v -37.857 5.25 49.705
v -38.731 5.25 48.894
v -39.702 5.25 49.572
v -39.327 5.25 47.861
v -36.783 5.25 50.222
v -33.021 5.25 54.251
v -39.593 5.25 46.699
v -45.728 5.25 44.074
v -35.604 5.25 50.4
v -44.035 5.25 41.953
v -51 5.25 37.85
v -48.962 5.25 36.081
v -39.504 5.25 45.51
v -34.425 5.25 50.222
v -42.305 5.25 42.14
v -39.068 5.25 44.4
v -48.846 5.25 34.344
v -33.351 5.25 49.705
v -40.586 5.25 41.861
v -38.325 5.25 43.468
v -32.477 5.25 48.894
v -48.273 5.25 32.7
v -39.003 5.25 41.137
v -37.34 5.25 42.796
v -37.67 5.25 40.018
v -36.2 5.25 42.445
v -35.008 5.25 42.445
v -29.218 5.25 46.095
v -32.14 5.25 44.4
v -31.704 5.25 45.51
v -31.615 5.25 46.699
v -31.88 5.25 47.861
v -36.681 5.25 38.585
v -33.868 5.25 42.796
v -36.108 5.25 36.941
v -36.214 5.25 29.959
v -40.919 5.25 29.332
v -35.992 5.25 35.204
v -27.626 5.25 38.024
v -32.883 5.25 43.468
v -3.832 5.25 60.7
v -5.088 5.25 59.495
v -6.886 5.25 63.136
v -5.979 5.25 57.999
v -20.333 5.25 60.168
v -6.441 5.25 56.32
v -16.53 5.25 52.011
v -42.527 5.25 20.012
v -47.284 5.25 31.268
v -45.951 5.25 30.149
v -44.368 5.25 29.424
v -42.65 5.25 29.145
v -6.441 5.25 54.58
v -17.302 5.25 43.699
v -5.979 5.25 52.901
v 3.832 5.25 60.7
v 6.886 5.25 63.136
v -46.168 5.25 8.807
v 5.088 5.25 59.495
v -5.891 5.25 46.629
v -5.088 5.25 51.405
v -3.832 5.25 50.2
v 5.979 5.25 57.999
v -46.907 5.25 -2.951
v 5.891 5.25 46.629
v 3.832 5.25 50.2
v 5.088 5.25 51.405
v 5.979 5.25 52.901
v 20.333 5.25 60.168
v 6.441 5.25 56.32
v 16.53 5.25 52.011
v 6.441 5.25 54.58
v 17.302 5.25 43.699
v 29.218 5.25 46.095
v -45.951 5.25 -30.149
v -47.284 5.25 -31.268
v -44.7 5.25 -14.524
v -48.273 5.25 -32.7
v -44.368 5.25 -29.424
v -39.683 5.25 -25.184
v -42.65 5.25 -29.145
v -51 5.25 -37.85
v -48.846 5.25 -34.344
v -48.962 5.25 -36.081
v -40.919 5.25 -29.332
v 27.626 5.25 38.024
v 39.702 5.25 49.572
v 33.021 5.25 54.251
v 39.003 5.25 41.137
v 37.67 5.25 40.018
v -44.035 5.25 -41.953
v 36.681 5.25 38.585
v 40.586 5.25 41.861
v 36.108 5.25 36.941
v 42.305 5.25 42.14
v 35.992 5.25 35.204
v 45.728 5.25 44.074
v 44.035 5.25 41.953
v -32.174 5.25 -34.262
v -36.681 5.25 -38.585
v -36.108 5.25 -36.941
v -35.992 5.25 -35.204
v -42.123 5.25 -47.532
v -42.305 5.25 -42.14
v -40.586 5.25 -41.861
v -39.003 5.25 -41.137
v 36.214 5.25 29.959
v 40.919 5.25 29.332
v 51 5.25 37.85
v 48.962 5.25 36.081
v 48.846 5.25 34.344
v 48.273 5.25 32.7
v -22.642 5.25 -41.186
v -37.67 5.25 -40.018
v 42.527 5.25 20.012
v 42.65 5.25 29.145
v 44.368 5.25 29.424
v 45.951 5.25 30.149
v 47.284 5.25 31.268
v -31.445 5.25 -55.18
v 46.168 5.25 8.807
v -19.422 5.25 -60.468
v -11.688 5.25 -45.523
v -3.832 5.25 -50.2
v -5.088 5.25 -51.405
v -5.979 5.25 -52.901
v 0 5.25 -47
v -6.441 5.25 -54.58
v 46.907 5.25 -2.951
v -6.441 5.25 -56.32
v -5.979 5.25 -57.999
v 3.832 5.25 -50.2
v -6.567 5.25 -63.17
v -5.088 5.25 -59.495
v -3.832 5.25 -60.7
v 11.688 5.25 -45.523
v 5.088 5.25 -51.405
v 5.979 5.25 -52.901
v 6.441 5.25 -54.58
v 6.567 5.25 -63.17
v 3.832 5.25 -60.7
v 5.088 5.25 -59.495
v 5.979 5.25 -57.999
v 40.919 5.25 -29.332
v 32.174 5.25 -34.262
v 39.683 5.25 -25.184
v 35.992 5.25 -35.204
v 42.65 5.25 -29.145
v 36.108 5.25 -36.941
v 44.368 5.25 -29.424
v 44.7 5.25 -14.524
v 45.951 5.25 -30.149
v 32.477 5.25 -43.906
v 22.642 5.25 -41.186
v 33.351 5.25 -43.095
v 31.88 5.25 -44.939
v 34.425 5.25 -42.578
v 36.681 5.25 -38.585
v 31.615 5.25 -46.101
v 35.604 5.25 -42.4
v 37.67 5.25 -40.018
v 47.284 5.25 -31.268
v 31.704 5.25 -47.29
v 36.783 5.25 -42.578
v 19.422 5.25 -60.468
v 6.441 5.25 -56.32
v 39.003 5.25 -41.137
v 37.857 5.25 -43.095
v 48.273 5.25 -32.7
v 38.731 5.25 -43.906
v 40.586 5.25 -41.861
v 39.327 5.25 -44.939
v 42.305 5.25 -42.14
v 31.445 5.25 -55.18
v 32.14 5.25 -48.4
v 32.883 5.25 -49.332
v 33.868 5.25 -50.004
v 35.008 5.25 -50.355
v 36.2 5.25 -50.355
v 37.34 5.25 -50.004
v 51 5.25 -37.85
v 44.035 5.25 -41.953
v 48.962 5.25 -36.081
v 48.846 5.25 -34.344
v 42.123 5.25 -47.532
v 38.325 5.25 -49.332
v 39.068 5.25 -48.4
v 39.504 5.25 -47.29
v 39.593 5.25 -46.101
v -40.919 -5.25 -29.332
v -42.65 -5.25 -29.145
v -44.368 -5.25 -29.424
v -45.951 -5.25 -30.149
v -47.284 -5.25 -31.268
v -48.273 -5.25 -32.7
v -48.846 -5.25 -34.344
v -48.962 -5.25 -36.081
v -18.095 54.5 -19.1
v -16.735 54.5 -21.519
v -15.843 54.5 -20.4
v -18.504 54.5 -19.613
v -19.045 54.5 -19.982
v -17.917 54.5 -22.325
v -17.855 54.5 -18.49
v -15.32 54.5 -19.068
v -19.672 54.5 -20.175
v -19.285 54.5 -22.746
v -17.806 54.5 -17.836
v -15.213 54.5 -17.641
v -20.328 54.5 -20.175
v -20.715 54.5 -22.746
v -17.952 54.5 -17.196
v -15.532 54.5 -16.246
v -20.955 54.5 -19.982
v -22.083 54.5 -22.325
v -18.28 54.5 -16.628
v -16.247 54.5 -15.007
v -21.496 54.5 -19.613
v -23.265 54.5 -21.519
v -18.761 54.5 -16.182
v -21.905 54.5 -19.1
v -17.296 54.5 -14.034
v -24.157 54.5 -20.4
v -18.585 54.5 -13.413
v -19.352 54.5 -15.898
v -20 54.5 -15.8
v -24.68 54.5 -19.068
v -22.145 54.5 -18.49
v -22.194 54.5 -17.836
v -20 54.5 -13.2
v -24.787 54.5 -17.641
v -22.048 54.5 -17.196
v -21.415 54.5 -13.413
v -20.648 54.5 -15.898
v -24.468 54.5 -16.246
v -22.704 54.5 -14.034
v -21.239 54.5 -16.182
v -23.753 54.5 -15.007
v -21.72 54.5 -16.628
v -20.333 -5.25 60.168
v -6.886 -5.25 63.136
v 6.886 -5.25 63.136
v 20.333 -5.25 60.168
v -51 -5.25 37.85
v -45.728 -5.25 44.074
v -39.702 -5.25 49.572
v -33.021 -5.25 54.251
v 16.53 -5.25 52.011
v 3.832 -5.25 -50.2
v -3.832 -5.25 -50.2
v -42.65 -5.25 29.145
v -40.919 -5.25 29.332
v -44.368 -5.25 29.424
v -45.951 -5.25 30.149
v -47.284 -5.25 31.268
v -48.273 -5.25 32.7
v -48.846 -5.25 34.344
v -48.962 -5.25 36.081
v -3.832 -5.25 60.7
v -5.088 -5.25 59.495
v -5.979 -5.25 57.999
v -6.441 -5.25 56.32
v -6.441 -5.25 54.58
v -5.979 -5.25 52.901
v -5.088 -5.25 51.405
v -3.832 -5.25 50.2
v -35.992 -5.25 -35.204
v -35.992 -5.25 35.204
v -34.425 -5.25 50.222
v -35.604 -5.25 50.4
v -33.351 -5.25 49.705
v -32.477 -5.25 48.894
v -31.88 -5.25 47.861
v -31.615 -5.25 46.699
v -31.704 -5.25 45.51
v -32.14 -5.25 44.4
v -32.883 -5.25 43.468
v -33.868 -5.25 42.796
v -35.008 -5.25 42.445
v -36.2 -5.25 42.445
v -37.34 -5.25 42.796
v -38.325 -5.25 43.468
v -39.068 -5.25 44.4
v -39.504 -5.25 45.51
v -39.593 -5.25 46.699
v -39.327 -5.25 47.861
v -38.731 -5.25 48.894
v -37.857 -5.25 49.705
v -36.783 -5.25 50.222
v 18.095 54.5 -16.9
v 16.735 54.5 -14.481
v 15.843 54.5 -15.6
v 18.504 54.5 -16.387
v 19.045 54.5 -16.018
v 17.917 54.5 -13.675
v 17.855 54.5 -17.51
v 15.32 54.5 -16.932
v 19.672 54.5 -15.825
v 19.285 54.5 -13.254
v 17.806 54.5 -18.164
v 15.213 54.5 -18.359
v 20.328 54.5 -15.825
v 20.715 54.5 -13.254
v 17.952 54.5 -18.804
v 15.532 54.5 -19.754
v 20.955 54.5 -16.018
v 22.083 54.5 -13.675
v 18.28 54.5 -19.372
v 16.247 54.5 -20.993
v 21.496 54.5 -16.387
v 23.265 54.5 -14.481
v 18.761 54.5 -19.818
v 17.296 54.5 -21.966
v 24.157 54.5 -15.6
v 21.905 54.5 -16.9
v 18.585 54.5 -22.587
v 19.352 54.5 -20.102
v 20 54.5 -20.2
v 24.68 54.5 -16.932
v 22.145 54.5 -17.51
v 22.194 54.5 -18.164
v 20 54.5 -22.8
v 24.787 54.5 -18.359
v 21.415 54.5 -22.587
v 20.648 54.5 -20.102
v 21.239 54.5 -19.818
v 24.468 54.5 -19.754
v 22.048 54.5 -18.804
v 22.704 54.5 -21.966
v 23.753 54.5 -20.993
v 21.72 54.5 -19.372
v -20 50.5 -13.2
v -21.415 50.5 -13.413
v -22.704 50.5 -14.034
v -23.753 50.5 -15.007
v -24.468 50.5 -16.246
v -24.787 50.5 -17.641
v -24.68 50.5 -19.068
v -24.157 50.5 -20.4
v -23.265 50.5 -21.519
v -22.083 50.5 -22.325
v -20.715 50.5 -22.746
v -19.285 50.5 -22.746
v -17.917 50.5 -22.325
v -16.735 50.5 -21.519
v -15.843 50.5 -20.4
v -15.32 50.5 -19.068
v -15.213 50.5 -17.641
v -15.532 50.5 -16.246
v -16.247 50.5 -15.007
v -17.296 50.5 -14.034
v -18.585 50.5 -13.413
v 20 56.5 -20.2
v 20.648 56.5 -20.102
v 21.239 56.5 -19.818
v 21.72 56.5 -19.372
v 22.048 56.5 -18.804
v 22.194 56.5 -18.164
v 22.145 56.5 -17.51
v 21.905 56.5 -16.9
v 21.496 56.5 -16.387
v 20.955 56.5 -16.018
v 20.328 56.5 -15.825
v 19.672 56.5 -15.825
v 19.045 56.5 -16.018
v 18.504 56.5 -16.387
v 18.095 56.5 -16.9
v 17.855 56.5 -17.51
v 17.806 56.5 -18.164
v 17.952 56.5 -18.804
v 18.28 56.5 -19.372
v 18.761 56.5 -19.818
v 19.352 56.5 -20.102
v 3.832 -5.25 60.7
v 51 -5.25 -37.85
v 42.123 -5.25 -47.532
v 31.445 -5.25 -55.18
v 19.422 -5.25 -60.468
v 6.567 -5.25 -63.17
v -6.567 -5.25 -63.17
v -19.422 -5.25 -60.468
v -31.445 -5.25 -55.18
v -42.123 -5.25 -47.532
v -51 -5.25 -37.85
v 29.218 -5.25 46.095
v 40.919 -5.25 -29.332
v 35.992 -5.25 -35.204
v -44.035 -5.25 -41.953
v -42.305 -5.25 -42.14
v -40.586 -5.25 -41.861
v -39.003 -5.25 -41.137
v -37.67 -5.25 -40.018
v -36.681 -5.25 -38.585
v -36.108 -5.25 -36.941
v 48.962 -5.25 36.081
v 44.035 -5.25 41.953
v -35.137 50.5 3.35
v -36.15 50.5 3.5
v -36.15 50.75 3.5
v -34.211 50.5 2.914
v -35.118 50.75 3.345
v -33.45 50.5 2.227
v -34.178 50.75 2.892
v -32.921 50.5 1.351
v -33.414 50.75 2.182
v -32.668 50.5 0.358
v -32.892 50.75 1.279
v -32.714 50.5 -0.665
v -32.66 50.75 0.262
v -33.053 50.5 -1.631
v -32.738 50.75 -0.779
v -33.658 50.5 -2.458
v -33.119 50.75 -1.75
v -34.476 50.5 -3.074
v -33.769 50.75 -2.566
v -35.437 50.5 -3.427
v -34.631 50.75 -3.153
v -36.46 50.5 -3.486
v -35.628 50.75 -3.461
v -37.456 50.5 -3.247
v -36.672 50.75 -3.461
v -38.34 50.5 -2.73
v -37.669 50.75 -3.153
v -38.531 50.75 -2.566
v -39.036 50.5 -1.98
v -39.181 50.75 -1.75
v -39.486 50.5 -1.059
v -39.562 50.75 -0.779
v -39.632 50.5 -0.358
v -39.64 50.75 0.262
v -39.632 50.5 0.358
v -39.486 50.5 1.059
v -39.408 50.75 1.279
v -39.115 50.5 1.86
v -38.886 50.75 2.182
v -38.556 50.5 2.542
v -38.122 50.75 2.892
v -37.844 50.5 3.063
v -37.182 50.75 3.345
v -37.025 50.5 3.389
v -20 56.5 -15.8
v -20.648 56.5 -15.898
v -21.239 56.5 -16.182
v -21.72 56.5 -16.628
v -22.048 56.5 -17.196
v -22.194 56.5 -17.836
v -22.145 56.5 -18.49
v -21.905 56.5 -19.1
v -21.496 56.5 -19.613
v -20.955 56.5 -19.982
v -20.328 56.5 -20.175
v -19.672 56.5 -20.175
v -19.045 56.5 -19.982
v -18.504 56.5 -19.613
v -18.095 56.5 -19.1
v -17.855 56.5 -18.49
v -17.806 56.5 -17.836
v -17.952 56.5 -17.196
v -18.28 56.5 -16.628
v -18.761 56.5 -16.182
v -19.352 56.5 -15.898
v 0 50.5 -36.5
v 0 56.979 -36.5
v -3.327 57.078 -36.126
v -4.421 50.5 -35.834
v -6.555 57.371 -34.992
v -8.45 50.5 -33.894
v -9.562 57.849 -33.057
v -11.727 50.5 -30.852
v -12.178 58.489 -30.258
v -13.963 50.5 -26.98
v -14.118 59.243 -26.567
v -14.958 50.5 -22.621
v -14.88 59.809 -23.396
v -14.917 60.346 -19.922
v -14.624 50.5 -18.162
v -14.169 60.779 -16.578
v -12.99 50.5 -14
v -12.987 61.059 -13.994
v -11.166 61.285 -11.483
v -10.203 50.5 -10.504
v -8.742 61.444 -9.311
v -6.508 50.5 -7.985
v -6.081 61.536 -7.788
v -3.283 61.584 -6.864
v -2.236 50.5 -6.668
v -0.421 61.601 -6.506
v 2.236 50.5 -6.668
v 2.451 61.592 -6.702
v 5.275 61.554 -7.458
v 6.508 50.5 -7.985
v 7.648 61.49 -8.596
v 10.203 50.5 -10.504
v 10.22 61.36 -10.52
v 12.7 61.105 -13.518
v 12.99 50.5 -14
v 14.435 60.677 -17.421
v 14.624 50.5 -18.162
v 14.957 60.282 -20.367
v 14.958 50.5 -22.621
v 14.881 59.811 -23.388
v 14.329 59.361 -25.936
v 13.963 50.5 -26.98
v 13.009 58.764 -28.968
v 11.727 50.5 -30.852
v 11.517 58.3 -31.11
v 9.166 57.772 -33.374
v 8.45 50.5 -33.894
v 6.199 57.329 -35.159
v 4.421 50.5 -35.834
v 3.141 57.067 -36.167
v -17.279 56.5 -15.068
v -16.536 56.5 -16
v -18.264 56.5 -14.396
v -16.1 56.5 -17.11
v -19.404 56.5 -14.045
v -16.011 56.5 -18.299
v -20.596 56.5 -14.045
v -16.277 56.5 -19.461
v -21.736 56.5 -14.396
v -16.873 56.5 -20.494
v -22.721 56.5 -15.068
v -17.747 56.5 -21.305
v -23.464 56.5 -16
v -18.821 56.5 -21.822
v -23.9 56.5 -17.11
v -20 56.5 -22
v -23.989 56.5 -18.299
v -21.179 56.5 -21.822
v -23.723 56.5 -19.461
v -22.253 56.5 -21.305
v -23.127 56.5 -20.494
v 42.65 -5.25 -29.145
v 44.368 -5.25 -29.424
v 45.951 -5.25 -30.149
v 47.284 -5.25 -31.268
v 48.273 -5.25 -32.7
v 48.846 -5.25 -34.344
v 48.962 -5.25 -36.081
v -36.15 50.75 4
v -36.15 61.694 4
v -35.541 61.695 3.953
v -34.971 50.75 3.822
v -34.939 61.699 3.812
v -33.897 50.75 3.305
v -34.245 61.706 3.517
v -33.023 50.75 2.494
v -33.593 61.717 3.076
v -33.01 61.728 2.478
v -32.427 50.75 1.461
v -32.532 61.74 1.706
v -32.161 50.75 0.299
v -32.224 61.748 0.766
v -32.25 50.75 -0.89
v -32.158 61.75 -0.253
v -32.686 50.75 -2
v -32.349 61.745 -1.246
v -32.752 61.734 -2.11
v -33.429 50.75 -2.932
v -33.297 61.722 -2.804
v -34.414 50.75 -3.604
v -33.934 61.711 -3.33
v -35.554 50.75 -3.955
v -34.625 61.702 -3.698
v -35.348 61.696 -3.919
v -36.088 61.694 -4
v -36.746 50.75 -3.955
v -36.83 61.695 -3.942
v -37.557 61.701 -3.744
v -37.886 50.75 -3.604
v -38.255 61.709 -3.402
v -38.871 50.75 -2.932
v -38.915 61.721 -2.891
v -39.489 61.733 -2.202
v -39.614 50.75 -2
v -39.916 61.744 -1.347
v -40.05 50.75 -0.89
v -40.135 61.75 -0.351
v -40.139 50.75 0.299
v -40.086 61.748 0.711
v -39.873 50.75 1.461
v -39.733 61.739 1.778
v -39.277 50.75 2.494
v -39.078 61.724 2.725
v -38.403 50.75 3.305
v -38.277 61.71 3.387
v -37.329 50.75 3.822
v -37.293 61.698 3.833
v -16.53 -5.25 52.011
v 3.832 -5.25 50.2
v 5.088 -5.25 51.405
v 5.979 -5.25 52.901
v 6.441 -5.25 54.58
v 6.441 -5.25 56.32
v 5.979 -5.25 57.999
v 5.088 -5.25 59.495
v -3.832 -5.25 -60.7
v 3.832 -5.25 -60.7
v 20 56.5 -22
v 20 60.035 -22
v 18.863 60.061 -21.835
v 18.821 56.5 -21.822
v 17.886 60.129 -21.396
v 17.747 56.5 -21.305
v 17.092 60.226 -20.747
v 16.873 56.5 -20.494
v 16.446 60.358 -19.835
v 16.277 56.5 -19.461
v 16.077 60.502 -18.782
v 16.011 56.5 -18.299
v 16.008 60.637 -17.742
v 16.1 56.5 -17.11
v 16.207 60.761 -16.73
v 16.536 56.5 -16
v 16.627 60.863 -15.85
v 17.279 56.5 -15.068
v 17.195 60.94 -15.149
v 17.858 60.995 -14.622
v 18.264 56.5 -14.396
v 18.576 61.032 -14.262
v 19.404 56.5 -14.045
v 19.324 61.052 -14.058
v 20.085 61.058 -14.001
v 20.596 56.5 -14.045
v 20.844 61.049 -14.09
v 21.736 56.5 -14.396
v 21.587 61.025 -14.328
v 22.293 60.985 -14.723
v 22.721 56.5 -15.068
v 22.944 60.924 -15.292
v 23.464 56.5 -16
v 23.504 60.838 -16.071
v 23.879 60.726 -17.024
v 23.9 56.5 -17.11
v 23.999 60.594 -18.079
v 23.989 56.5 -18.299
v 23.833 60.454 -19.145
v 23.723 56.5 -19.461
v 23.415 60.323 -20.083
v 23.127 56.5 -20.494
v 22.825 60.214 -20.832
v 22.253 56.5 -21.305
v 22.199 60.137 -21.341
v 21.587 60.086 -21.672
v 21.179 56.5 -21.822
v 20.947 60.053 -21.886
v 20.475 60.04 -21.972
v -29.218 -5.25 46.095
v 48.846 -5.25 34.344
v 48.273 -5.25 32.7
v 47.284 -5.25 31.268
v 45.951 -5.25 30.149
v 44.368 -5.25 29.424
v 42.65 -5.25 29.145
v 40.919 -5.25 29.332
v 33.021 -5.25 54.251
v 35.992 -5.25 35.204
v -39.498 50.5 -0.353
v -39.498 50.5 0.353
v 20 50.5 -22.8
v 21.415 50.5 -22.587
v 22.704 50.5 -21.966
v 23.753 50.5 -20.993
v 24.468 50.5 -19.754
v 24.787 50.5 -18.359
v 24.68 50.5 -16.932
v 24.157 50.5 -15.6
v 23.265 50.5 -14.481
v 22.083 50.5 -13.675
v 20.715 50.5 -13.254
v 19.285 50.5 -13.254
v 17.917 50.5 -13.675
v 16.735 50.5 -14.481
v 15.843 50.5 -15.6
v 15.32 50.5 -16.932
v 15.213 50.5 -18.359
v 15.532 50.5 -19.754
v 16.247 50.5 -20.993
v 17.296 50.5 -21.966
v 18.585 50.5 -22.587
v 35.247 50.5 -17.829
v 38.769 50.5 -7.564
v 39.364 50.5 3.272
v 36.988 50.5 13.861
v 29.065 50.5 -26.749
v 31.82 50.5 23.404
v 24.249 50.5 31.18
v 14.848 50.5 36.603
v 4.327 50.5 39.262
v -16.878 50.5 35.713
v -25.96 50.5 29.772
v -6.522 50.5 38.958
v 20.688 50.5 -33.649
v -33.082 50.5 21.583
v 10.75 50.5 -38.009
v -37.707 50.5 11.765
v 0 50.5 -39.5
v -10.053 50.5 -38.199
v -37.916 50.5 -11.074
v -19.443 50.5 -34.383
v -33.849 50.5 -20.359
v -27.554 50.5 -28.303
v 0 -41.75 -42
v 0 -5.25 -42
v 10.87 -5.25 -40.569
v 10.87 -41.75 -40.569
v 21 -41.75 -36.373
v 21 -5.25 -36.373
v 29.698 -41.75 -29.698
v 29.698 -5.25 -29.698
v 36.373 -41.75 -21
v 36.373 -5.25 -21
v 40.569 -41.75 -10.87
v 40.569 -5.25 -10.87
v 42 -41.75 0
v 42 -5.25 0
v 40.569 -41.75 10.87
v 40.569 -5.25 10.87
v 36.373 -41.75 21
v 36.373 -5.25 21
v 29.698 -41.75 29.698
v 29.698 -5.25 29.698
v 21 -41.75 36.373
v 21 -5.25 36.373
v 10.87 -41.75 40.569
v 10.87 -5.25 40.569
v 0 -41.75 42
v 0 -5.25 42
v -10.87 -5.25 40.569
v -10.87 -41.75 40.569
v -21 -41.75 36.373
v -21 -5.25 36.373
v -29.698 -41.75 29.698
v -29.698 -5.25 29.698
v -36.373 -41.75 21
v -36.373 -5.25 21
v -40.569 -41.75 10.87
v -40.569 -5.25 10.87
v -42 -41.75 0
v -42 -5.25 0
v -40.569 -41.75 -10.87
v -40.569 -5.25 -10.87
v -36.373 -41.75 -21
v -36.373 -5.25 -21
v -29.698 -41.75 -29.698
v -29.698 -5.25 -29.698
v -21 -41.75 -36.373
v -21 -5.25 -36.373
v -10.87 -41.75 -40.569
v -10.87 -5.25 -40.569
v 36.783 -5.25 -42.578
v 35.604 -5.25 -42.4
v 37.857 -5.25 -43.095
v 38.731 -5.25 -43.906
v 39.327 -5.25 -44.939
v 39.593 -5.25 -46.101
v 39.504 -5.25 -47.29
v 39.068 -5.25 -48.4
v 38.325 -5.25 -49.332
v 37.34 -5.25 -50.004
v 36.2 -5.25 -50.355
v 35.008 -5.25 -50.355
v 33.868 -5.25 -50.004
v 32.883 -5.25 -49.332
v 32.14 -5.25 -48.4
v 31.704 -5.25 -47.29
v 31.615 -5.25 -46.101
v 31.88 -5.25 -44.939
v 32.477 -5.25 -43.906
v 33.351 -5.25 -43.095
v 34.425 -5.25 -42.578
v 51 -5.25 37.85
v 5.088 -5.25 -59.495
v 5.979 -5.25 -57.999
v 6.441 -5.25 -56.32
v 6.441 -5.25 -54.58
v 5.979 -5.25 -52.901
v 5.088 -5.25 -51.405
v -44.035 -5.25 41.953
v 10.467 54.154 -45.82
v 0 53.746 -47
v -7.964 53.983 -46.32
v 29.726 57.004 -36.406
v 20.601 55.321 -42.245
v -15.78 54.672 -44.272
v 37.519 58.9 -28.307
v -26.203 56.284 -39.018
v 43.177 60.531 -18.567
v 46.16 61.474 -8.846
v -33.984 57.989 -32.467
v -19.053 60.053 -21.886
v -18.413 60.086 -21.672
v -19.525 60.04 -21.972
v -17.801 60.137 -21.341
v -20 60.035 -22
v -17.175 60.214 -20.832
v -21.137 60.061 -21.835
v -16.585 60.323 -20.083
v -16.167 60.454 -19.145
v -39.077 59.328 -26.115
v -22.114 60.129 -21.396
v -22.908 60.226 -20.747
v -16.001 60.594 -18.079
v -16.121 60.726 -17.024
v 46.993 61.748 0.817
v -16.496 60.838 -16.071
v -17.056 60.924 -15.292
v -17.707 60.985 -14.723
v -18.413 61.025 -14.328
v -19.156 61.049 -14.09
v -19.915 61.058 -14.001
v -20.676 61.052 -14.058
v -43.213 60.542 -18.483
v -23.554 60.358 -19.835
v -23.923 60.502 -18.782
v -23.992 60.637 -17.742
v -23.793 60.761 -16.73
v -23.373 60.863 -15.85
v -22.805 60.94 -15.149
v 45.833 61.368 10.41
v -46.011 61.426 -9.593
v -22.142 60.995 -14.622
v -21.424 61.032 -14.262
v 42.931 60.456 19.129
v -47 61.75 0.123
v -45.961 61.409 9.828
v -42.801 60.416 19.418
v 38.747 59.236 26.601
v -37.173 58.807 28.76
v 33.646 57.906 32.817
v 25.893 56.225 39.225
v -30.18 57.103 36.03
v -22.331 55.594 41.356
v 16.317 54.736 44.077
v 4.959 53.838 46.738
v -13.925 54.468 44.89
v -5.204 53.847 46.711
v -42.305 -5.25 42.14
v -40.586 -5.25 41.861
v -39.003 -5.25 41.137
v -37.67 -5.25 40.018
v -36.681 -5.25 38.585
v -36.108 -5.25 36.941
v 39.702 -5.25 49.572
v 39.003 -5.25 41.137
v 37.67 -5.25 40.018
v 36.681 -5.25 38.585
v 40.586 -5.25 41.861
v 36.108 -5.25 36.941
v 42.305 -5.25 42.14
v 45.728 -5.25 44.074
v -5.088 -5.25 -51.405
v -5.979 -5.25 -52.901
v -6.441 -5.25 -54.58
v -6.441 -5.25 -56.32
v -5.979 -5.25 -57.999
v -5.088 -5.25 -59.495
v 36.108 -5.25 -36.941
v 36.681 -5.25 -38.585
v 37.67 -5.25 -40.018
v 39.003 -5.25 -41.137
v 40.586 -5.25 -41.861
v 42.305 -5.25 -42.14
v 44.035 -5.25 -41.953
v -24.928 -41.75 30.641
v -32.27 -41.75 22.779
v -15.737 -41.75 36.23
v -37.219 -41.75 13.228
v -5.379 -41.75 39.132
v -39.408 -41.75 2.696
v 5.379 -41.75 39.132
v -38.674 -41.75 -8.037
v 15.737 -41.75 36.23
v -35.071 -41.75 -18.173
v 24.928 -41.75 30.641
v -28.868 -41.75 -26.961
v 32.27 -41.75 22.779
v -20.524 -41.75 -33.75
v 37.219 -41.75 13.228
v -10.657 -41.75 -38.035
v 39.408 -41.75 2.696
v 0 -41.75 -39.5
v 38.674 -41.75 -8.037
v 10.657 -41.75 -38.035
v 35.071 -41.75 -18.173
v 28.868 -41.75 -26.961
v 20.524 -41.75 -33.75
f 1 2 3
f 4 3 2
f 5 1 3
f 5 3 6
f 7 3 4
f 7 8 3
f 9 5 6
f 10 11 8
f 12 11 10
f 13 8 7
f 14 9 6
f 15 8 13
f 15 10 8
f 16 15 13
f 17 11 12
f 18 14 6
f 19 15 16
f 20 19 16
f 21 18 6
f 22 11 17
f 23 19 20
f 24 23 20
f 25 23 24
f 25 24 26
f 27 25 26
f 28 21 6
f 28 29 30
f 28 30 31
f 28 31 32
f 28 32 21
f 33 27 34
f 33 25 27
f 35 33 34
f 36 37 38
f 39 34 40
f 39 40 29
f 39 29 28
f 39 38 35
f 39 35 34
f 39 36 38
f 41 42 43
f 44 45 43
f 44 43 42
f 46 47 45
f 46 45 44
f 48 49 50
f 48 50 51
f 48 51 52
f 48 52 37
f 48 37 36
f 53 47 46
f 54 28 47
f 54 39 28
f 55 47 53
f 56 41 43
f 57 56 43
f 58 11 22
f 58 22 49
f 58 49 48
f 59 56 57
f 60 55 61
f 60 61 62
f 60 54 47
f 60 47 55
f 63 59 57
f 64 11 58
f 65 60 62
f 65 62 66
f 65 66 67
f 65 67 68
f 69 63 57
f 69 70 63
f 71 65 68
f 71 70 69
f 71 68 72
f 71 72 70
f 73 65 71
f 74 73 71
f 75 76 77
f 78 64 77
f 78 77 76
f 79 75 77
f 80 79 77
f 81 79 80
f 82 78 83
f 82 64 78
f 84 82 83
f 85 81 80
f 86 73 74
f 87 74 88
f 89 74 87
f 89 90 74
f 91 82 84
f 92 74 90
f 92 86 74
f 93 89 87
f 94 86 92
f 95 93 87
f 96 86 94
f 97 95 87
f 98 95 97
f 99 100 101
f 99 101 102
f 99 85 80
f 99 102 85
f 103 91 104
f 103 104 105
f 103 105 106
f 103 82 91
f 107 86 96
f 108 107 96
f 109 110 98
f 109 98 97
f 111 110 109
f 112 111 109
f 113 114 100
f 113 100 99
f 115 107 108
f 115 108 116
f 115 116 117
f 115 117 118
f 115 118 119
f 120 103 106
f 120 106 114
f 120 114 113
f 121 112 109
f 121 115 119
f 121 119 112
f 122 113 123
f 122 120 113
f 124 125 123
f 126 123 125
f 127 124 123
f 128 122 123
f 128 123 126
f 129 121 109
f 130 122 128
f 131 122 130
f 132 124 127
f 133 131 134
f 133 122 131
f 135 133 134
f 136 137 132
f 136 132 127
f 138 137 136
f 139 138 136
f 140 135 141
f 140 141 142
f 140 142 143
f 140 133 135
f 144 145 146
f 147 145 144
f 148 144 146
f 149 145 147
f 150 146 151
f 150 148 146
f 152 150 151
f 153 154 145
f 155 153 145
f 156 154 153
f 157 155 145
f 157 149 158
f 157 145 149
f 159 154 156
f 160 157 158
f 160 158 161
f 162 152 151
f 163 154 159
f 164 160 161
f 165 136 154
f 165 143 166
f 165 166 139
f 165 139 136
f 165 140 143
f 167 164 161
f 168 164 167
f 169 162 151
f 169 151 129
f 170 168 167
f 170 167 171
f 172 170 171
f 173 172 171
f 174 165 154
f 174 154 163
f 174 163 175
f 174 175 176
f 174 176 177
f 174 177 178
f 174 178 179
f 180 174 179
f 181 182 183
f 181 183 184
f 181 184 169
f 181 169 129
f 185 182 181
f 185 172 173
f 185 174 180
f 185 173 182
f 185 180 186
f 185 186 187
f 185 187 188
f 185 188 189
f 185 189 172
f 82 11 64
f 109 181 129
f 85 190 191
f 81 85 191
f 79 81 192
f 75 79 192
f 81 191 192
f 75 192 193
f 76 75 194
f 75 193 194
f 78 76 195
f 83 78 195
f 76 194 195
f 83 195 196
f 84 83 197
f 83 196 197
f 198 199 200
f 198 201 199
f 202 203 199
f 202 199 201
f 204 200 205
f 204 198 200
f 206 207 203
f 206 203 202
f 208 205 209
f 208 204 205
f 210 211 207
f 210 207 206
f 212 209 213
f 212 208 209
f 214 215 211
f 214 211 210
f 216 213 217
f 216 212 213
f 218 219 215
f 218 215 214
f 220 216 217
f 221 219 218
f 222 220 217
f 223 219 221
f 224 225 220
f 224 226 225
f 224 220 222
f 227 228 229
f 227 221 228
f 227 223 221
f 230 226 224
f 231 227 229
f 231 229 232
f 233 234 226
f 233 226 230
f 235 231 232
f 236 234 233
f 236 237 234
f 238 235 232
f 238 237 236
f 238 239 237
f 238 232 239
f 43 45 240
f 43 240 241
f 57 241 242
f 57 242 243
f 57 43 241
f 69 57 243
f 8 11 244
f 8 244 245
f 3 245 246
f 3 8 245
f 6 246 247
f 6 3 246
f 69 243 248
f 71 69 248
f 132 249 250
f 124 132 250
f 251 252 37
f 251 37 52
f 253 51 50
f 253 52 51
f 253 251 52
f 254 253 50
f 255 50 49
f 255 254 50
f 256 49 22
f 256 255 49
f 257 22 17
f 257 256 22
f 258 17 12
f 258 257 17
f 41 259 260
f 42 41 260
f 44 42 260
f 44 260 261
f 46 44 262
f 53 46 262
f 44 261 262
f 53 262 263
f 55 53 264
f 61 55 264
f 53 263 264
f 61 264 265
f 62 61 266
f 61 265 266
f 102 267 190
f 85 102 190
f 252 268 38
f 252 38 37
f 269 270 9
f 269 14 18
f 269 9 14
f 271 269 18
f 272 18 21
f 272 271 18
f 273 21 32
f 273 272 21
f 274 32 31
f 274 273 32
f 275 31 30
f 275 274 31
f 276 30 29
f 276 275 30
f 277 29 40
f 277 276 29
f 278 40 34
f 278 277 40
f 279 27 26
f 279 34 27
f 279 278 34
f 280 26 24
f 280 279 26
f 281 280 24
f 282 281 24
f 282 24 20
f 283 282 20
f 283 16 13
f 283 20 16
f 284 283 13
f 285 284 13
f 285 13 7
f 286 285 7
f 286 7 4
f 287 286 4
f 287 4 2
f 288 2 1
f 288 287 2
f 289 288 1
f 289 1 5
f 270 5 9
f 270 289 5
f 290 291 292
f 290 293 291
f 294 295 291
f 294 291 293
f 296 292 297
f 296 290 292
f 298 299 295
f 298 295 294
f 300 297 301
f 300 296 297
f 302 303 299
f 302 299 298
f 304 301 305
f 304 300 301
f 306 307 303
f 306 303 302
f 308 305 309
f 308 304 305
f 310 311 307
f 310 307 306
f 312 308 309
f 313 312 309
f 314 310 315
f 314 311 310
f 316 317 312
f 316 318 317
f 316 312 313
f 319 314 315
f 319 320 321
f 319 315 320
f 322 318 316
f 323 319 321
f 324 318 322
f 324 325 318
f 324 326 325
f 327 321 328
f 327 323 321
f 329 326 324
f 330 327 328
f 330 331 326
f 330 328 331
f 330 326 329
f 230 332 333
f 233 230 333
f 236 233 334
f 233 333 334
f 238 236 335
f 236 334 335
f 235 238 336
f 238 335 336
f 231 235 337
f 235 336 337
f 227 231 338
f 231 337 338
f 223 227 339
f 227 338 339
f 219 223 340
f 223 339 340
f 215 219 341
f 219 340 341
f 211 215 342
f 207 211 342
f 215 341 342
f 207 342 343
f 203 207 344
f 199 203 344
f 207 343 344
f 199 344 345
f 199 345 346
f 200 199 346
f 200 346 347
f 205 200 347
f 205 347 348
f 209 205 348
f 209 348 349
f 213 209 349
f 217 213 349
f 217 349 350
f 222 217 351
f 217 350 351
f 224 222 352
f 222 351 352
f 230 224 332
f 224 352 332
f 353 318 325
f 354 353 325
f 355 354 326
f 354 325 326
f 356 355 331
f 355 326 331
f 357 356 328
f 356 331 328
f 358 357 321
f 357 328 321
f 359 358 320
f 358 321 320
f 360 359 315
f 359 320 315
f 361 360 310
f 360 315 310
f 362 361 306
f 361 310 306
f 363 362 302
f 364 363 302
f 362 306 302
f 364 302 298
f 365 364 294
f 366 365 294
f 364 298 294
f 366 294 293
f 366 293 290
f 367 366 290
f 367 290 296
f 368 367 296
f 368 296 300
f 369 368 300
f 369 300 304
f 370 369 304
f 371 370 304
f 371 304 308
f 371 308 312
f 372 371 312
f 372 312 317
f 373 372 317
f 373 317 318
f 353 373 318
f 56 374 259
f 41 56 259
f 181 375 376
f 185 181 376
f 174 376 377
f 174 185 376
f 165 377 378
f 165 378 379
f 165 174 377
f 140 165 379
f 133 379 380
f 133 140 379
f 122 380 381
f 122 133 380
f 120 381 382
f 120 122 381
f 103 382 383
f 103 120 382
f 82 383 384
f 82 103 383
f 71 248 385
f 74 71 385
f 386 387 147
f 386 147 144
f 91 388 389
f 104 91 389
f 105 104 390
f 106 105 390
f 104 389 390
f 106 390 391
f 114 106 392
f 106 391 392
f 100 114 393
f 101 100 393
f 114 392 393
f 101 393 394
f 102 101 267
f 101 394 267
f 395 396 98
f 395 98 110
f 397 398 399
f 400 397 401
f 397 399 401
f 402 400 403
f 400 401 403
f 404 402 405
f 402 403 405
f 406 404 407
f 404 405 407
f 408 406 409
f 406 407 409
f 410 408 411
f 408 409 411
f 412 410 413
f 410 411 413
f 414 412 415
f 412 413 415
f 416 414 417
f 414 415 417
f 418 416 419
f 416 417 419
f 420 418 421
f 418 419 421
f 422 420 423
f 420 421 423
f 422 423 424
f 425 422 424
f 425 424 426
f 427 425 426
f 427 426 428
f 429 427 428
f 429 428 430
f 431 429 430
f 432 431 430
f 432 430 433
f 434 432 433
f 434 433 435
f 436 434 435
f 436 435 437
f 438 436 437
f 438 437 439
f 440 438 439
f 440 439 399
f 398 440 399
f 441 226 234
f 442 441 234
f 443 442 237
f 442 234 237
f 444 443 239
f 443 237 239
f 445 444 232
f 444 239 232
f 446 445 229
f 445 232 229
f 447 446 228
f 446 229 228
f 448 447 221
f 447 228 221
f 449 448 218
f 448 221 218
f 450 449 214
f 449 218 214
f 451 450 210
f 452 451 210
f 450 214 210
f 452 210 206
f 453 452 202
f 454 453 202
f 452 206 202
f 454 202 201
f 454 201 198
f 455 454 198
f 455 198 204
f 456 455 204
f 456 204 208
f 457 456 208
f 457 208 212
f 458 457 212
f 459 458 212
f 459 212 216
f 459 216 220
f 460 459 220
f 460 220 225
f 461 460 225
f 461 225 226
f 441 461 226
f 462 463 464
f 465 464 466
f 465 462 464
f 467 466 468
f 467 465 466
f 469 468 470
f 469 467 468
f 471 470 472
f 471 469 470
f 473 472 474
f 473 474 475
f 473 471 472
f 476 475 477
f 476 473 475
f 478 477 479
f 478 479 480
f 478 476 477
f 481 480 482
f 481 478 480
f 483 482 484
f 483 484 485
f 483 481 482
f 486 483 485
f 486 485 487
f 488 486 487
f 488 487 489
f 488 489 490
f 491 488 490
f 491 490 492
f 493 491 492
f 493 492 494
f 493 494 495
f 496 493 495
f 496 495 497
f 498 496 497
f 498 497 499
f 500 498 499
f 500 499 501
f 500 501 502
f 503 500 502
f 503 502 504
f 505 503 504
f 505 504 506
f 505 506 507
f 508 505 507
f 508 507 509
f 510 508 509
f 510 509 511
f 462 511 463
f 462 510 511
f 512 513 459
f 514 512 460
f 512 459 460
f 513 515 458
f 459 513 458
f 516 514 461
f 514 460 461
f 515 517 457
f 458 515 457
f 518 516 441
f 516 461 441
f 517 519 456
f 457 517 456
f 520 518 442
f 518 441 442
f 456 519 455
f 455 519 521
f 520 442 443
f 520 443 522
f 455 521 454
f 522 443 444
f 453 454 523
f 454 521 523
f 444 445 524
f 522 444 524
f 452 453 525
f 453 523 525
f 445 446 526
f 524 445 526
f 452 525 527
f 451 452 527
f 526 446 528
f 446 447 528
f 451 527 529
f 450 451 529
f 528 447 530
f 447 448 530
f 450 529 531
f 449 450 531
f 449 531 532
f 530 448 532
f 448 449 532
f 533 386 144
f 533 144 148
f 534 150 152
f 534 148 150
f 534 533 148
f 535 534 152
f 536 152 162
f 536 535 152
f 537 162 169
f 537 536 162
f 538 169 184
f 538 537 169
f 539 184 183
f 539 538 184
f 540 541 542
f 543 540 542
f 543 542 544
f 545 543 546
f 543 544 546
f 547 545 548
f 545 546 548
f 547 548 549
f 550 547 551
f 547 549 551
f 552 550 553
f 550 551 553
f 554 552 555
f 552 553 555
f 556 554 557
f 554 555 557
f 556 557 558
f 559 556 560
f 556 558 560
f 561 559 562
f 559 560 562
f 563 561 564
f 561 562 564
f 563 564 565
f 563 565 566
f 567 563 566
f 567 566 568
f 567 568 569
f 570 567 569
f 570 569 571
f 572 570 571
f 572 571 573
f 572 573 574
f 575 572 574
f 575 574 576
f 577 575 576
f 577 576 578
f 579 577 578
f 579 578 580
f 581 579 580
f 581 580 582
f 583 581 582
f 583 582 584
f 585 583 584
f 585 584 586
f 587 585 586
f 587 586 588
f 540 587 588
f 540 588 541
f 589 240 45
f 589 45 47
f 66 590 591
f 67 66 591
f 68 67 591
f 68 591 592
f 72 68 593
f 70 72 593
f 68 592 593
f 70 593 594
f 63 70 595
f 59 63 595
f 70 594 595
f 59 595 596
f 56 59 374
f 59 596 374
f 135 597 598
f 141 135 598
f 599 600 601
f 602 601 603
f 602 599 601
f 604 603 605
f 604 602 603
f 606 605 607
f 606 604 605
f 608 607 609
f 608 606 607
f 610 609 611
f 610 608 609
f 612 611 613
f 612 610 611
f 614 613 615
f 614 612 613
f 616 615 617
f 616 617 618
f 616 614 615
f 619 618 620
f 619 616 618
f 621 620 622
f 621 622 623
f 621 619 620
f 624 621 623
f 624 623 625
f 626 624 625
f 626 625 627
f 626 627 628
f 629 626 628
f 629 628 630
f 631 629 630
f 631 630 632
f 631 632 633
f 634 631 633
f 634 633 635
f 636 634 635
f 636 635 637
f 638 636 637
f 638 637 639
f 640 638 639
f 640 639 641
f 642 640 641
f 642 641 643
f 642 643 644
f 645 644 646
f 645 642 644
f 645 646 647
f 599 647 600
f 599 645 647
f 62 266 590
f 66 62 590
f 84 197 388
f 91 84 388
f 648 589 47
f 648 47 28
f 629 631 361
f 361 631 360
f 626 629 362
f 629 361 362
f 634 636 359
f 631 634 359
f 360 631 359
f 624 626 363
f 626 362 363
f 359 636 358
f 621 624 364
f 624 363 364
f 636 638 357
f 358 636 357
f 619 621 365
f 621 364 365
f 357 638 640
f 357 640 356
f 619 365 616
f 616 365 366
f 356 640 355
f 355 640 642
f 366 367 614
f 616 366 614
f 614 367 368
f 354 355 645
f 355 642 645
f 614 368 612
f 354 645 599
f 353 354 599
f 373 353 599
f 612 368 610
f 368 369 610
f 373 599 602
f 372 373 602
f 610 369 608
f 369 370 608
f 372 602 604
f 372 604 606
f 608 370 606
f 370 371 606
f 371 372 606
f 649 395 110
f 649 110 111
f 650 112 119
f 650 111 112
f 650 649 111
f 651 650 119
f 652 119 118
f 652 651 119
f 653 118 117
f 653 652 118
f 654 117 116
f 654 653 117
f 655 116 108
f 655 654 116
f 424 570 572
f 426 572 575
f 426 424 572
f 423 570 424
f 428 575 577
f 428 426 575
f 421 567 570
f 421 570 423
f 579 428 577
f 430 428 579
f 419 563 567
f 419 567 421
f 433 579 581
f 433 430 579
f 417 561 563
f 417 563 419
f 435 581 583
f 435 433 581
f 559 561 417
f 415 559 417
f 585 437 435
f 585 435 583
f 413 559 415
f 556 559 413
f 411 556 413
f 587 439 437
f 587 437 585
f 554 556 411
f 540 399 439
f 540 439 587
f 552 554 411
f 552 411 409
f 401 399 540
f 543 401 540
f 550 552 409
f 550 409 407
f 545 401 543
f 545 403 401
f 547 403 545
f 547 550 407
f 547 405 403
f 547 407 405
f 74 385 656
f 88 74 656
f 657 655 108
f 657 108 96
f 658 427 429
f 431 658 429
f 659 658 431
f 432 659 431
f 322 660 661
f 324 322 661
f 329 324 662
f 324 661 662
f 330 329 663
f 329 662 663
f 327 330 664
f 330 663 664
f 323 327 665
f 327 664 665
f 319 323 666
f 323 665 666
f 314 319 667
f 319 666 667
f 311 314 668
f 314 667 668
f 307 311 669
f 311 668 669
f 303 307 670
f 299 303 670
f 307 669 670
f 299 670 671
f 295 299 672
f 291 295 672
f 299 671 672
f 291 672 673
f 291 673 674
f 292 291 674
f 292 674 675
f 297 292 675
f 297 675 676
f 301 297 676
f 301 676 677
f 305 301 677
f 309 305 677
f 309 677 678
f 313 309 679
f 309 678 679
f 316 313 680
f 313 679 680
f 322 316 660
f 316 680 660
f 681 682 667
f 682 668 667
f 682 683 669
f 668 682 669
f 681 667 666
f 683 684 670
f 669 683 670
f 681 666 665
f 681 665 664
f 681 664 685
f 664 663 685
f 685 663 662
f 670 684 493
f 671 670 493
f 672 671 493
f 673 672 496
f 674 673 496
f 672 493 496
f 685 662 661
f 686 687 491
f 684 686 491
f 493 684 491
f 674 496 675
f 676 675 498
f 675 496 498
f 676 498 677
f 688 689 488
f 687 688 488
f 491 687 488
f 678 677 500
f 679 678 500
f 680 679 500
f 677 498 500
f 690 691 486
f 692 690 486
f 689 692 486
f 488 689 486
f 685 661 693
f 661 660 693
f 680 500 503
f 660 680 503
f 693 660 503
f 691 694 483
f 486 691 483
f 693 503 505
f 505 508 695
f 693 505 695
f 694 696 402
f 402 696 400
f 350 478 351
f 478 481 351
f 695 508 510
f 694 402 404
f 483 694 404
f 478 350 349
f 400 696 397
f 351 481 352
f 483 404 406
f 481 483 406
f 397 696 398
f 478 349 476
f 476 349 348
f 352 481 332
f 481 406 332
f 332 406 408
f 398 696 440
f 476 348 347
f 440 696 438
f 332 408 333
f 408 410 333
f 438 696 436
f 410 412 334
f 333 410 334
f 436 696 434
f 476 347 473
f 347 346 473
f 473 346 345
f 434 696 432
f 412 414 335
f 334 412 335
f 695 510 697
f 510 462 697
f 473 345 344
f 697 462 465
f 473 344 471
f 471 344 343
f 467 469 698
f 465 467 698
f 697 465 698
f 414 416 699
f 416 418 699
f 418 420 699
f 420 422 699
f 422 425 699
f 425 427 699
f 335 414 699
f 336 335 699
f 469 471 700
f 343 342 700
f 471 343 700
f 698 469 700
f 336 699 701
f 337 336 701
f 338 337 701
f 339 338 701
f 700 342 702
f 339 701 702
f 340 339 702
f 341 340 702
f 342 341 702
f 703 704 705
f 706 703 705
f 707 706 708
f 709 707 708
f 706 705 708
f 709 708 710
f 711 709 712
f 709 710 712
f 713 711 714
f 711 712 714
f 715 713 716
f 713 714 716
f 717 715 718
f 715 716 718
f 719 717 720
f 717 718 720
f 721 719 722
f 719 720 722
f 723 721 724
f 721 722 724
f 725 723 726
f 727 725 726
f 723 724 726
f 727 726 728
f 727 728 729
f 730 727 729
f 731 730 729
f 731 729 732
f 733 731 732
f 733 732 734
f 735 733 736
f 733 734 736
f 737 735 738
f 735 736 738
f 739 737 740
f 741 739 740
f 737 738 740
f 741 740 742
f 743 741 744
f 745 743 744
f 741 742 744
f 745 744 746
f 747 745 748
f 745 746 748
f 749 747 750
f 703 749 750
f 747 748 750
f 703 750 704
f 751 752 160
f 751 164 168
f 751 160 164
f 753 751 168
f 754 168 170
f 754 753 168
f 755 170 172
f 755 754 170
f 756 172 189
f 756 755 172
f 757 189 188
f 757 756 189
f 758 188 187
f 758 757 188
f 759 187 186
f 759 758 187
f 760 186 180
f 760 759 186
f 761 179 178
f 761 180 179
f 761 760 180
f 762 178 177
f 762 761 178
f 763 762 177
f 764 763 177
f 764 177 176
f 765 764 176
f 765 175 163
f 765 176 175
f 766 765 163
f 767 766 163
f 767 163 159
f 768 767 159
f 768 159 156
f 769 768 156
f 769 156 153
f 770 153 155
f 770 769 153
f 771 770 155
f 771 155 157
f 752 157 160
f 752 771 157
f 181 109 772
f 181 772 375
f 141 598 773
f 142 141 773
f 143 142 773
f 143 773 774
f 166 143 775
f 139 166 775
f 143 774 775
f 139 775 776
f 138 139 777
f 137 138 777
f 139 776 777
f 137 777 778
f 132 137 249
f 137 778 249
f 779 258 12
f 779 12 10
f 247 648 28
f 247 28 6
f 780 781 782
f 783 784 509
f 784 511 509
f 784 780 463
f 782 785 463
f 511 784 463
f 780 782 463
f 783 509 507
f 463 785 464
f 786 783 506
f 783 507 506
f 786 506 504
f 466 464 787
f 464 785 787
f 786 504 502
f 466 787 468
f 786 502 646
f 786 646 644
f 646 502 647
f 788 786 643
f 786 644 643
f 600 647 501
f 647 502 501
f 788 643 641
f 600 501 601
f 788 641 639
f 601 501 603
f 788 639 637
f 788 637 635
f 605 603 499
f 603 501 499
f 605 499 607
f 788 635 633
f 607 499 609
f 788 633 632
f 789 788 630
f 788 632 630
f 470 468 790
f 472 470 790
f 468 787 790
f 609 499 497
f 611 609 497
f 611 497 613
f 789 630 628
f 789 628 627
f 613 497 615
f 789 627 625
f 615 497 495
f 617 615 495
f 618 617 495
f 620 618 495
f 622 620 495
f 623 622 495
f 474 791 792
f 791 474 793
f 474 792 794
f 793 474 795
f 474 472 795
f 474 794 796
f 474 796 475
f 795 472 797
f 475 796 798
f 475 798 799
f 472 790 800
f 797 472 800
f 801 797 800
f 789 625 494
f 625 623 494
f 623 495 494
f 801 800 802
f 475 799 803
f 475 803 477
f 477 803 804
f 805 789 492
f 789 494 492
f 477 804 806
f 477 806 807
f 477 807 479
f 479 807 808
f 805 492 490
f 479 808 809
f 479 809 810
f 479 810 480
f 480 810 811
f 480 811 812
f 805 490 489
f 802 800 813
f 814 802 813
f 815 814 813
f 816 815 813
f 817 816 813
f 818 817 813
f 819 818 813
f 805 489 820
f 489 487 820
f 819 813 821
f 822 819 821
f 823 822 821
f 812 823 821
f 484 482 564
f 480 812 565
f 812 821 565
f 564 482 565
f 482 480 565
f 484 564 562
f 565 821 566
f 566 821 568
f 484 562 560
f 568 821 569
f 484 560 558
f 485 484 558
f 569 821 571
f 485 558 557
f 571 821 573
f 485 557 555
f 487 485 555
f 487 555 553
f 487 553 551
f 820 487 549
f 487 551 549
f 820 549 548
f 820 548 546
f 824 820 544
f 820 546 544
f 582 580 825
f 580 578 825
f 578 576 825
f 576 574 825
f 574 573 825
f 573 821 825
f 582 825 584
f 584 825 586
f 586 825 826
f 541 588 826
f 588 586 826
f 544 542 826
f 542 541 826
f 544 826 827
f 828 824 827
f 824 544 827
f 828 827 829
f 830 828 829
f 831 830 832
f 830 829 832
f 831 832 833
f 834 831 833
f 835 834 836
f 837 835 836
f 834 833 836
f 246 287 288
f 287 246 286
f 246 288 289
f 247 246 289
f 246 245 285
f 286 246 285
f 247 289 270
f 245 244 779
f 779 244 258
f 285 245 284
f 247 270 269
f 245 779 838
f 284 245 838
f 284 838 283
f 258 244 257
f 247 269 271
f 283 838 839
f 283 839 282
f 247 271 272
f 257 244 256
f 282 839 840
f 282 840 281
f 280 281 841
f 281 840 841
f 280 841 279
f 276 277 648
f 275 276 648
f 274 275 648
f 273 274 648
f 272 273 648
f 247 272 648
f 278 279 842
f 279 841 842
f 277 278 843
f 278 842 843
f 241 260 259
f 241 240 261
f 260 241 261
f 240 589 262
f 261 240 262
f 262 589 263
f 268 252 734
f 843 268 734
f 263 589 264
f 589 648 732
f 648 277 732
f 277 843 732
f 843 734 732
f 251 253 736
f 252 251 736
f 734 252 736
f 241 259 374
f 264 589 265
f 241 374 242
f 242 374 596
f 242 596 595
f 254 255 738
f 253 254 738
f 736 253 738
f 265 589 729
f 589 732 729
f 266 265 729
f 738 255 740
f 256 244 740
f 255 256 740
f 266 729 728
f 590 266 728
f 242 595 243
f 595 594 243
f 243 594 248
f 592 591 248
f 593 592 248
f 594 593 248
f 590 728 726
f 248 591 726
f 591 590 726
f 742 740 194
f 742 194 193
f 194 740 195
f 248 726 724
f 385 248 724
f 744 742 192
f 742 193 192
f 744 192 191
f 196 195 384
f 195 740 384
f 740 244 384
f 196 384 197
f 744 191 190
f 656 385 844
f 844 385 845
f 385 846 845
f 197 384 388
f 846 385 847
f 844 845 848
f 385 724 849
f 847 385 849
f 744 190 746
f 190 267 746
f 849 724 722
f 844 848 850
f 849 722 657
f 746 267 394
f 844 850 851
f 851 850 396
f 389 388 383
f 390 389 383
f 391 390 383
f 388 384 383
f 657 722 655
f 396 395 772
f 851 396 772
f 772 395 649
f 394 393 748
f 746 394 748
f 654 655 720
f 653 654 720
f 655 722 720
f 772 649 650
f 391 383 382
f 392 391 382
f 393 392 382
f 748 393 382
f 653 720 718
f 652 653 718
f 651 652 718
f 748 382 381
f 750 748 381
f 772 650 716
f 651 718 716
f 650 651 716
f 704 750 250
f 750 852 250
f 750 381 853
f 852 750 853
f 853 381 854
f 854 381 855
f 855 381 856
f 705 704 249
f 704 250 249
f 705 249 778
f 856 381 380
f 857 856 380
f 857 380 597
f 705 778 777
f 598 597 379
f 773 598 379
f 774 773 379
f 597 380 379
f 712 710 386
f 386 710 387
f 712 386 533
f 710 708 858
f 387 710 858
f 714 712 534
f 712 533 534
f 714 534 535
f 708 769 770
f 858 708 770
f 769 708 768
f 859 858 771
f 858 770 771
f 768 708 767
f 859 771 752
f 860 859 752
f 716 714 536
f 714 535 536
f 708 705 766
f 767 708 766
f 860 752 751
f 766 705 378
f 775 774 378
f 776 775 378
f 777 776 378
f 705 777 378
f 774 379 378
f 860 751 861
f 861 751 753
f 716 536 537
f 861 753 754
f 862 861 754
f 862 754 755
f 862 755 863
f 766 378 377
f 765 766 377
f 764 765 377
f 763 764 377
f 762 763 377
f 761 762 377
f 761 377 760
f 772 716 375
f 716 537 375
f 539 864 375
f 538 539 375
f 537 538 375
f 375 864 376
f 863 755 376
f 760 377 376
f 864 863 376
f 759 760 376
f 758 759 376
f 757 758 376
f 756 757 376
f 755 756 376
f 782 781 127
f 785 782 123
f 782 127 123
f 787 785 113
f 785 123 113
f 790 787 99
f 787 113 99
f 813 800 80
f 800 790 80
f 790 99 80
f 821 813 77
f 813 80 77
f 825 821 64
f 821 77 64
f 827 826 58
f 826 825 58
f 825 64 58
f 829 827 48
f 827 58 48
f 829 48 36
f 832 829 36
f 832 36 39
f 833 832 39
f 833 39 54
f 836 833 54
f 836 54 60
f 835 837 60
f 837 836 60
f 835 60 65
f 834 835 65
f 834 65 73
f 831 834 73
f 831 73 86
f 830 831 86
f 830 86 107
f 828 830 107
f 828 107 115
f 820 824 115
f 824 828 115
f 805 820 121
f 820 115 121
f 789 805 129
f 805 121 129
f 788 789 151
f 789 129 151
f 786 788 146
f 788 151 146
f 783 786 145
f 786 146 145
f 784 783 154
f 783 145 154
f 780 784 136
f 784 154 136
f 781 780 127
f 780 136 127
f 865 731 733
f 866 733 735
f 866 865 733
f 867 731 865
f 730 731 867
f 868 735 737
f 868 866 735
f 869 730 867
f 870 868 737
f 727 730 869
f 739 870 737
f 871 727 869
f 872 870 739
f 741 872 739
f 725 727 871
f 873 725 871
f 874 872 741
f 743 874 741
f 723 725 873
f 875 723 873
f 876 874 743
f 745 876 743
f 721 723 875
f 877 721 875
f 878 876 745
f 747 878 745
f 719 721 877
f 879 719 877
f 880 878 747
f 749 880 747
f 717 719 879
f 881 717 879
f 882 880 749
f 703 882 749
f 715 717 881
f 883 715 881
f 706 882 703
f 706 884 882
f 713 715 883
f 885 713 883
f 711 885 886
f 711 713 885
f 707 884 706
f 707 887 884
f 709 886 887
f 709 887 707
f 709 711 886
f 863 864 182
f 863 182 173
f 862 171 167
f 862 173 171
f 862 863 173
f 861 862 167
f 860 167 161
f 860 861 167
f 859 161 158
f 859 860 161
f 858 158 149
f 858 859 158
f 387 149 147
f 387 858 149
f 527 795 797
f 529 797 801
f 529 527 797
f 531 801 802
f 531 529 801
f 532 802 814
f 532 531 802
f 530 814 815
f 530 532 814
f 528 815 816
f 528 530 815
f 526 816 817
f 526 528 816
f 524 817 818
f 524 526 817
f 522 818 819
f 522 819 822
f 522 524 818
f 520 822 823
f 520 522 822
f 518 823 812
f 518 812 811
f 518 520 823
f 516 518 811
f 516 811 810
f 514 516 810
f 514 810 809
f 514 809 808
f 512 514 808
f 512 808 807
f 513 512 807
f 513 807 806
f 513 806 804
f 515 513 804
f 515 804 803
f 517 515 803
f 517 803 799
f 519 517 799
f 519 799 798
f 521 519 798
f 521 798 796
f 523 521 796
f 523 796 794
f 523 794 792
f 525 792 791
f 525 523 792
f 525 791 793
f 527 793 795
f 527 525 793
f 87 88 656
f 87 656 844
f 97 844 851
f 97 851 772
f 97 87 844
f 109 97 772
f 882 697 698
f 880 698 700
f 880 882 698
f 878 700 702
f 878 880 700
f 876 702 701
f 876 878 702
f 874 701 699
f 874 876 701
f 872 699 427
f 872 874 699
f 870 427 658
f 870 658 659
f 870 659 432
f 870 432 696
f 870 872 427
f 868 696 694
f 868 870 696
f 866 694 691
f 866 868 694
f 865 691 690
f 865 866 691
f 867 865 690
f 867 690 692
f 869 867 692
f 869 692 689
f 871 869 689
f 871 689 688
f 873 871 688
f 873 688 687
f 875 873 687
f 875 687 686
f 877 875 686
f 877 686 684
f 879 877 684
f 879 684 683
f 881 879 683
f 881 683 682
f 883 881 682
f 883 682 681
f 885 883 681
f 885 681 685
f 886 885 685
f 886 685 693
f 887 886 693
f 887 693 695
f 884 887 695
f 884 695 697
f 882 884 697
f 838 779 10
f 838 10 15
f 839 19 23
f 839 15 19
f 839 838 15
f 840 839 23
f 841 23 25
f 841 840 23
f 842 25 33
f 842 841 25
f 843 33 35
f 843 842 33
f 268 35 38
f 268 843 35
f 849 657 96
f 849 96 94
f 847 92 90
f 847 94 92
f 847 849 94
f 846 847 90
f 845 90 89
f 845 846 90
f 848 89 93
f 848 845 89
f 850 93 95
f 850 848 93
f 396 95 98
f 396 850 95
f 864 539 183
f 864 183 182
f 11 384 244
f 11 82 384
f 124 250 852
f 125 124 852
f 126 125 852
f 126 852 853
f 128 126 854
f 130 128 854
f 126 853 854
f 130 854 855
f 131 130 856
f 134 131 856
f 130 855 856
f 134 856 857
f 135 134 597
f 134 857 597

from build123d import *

# Parameters (mm, degrees)
BOSS_EXTRUDE1_DEPTH     = 5.25
CUT_EXTRUDE1_DEPTH      = 82.622208988
CUT_EXTRUDE1_DEPTH_BACK = 82.622208988
SKETCH2_R               = 4
SKETCH3_R               = 47
BOSS_EXTRUDE2_DEPTH     = 56.5
CUT_EXTRUDE4_DEPTH      = 103.213917839
CUT_EXTRUDE4_DEPTH_BACK = 103.213917839
SKETCH5_R               = 4
SKETCH5_R_2             = 15
CUT_EXTRUDE5_DEPTH      = 56.5
SKETCH6_R               = 42
BOSS_EXTRUDE3_DEPTH     = 36.5
CUT_EXTRUDE6_DEPTH      = 50.5
CUT_EXTRUDE6_DEPTH_BACK = 42.5
SKETCH7_R               = 39.5
SKETCH9_R               = 4.8
BOSS_EXTRUDE4_DEPTH     = 6
SKETCH10_R              = 2.2
CUT_EXTRUDE7_DEPTH      = 124.063743645
SKETCH11_R              = 4.8
CUT_EXTRUDE8_DEPTH      = 4
SKETCH12_R              = 4
CUT_EXTRUDE9_DEPTH      = 11
SKETCH13_R              = 3.5
CUT_EXTRUDE10_DEPTH     = 11.25


with BuildPart() as part:
    # Sketch1 → Boss-Extrude1 (new, symmetric)
    with BuildSketch(Plane(origin=(0, 0, 0), x_dir=(1, 0, 0), z_dir=(0, 1, 0))):
        with BuildLine():
            Line((-51, 37.85), (-51, -37.85))
            ThreePointArc((-51, -37.85), (0, -63.510806167), (51, -37.85))
            Line((51, -37.85), (51, 37.85))
            ThreePointArc((51, 37.85), (0, 63.510806167), (-51, 37.85))
        make_face()
    extrude(amount=BOSS_EXTRUDE1_DEPTH, both=True)

    # Sketch2 → Cut-Extrude1 (cut, two sides: drawn at the far end of the back side and taken through both)
    with BuildSketch(Plane(origin=(0, 0, 0), x_dir=(1, 0, 0), z_dir=(0, 1, 0)).offset(-CUT_EXTRUDE1_DEPTH_BACK)):
        with Locations(Location((35.603972242, 46.4, 0), (0, 0, 270))):
            Circle(SKETCH2_R)
        with Locations(Location((-35.603972242, -46.4, 0), (0, 0, 270))):
            Circle(SKETCH2_R)
        with BuildLine():
            Line((-3.832427429, 60.7), (3.832427429, 60.7))
            ThreePointArc((3.832427429, 60.7), (6.5, 55.45), (3.832427429, 50.2))
            Line((3.832427429, 50.2), (-3.832427429, 50.2))
            ThreePointArc((-3.832427429, 50.2), (-6.5, 55.45), (-3.832427429, 60.7))
        make_face()
        with BuildLine():
            Line((-35.991994178, 35.203747742), (-40.918867911, 29.33212827))
            ThreePointArc((-40.918867911, 29.33212827), (-46.655283834, 30.663284077), (-48.962334564, 36.081398172))
            Line((-48.962334564, 36.081398172), (-44.035460831, 41.953017644))
            ThreePointArc((-44.035460831, 41.953017644), (-38.299044908, 40.621861837), (-35.991994178, 35.203747742))
        make_face()
        with BuildLine():
            Line((48.962334564, 36.081398172), (44.035460831, 41.953017644))
            ThreePointArc((44.035460831, 41.953017644), (38.299044908, 40.621861837), (35.991994178, 35.203747742))
            Line((35.991994178, 35.203747742), (40.918867911, 29.33212827))
            ThreePointArc((40.918867911, 29.33212827), (46.655283834, 30.663284077), (48.962334564, 36.081398172))
        make_face()
        with BuildLine():
            Line((40.918867911, -29.33212827), (35.991994178, -35.203747742))
            ThreePointArc((35.991994178, -35.203747742), (38.299044908, -40.621861837), (44.035460831, -41.953017644))
            Line((44.035460831, -41.953017644), (48.962334564, -36.081398172))
            ThreePointArc((48.962334564, -36.081398172), (46.655283834, -30.663284077), (40.918867911, -29.33212827))
        make_face()
        with BuildLine():
            Line((-3.832427429, -50.2), (3.832427429, -50.2))
            ThreePointArc((3.832427429, -50.2), (6.5, -55.45), (3.832427429, -60.7))
            Line((3.832427429, -60.7), (-3.832427429, -60.7))
            ThreePointArc((-3.832427429, -60.7), (-6.5, -55.45), (-3.832427429, -50.2))
        make_face()
        with BuildLine():
            Line((-35.991994178, -35.203747742), (-40.918867911, -29.33212827))
            ThreePointArc((-40.918867911, -29.33212827), (-46.655283834, -30.663284077), (-48.962334564, -36.081398172))
            Line((-48.962334564, -36.081398172), (-44.035460831, -41.953017644))
            ThreePointArc((-44.035460831, -41.953017644), (-38.299044908, -40.621861837), (-35.991994178, -35.203747742))
        make_face()
        with BuildLine():
            Line((-29.217888815, -46.094553684), (-33.02145317, -54.251323767))
            ThreePointArc((-33.02145317, -54.251323767), (-26.840826504, -57.56033819), (-20.333144152, -60.167979432))
            Line((-20.333144152, -60.167979432), (-16.529579796, -52.011209348))
            Line((-16.529579796, -52.011209348), (-29.217888815, -46.094553684))
        make_face()
        with BuildLine():
            Line((20.333144152, -60.167979432), (16.529579796, -52.011209348))
            Line((16.529579796, -52.011209348), (29.217888815, -46.094553684))
            Line((29.217888815, -46.094553684), (33.02145317, -54.251323767))
            ThreePointArc((33.02145317, -54.251323767), (26.840826504, -57.56033819), (20.333144152, -60.167979432))
        make_face()
    extrude(amount=CUT_EXTRUDE1_DEPTH + CUT_EXTRUDE1_DEPTH_BACK, mode=Mode.SUBTRACT)

    # Sketch3 → Boss-Extrude2 (add)
    with BuildSketch(Plane(origin=(0, 5.25, 0), x_dir=(1, 0, 0), z_dir=(0, 1, 0))):
        with Locations(Location((0, 0, 0), (0, 0, 90))):
            Circle(SKETCH3_R)
    extrude(amount=BOSS_EXTRUDE2_DEPTH)

    # Sketch4 → Cut-Extrude4 (cut, two sides: drawn at the far end of the back side and taken through both)
    with BuildSketch(Plane(origin=(0, 0, 0), x_dir=(0, 0, -1), z_dir=(1, 0, 0)).offset(-CUT_EXTRUDE4_DEPTH_BACK)):
        with BuildLine():
            Line((-47, 53.746268605), (-47, 76.557383468))
            Line((-47, 76.557383468), (47, 76.557383468))
            Line((47, 76.557383468), (47, 53.746268605))
            ThreePointArc((47, 53.746268605), (0, 61.75), (-47, 53.746268605))
        make_face()
    extrude(amount=CUT_EXTRUDE4_DEPTH + CUT_EXTRUDE4_DEPTH_BACK, mode=Mode.SUBTRACT)

    # Sketch5 → Cut-Extrude5 (cut)
    with BuildSketch(Plane(origin=(0, 5.25, 0), x_dir=(1, 0, 0), z_dir=(0, 1, 0))):
        with Locations(Location((20, 18, 0), (0, 0, 90))):
            Circle(SKETCH5_R)
        with Locations(Location((-20, 18, 0), (0, 0, 90))):
            Circle(SKETCH5_R)
        with Locations(Location((0, 21.5, 0), (0, 0, 90))):
            Circle(SKETCH5_R_2)
    extrude(amount=CUT_EXTRUDE5_DEPTH, mode=Mode.SUBTRACT)

    # Sketch6 → Boss-Extrude3 (add)
    with BuildSketch(Plane(origin=(0, -5.25, 0), x_dir=(-1, 0, 0), z_dir=(0, -1, 0))):
        with Locations(Location((0, 0, 0), (0, 0, 90))):
            Circle(SKETCH6_R)
    extrude(amount=BOSS_EXTRUDE3_DEPTH)

    # Sketch7 → Cut-Extrude6 (cut, two sides: drawn at the far end of the back side and taken through both)
    with BuildSketch(Plane(origin=(0, 0, 0), x_dir=(1, 0, 0), z_dir=(0, 1, 0)).offset(-CUT_EXTRUDE6_DEPTH_BACK)):
        with Locations(Location((0, 0, 0), (0, 0, 90))):
            Circle(SKETCH7_R)
    extrude(amount=CUT_EXTRUDE6_DEPTH + CUT_EXTRUDE6_DEPTH_BACK, mode=Mode.SUBTRACT)

    # Sketch9 → Boss-Extrude4 (add)
    with BuildSketch(Plane(origin=(0, 50.5, 0), x_dir=(-1, 0, 0), z_dir=(0, -1, 0))):
        with Locations((-20, 18)):
            Circle(SKETCH9_R)
        with Locations((20, 18)):
            Circle(SKETCH9_R)
    extrude(amount=-BOSS_EXTRUDE4_DEPTH)

    # Sketch10 → Cut-Extrude7 (cut, through all)
    with BuildSketch(Plane(origin=(0, 50.5, 0), x_dir=(-1, 0, 0), z_dir=(0, -1, 0))):
        with Locations(Location((-20, 18, 0), (0, 0, 90))):
            Circle(SKETCH10_R)
        with Locations(Location((20, 18, 0), (0, 0, 270))):
            Circle(SKETCH10_R)
    extrude(amount=-CUT_EXTRUDE7_DEPTH, mode=Mode.SUBTRACT)

    # Sketch11 → Cut-Extrude8 (cut)
    with BuildSketch(Plane(origin=(0, 50.5, 0), x_dir=(-1, 0, 0), z_dir=(0, -1, 0))):
        with Locations(Location((-20, 18, 0), (0, 0, 90))):
            Circle(SKETCH11_R)
        with Locations(Location((20, 18, 0), (0, 0, 270))):
            Circle(SKETCH11_R)
    extrude(amount=-CUT_EXTRUDE8_DEPTH, mode=Mode.SUBTRACT)

    # Sketch12 → Cut-Extrude9 (cut)
    with BuildSketch(Plane(origin=(0, 61.75, 0), x_dir=(1, 0, 0), z_dir=(0, 1, 0))):
        with Locations(Location((-36.15, 0, 0), (0, 0, 270))):
            Circle(SKETCH12_R)
    extrude(amount=-CUT_EXTRUDE9_DEPTH, mode=Mode.SUBTRACT)

    # Sketch13 → Cut-Extrude10 (cut)
    with BuildSketch(Plane(origin=(0, 61.75, 0), x_dir=(1, 0, 0), z_dir=(0, 1, 0))):
        with Locations(Location((-36.15, 0, 0), (0, 0, 270))):
            Circle(SKETCH13_R)
    extrude(amount=-CUT_EXTRUDE10_DEPTH, mode=Mode.SUBTRACT)


solid = part.part
